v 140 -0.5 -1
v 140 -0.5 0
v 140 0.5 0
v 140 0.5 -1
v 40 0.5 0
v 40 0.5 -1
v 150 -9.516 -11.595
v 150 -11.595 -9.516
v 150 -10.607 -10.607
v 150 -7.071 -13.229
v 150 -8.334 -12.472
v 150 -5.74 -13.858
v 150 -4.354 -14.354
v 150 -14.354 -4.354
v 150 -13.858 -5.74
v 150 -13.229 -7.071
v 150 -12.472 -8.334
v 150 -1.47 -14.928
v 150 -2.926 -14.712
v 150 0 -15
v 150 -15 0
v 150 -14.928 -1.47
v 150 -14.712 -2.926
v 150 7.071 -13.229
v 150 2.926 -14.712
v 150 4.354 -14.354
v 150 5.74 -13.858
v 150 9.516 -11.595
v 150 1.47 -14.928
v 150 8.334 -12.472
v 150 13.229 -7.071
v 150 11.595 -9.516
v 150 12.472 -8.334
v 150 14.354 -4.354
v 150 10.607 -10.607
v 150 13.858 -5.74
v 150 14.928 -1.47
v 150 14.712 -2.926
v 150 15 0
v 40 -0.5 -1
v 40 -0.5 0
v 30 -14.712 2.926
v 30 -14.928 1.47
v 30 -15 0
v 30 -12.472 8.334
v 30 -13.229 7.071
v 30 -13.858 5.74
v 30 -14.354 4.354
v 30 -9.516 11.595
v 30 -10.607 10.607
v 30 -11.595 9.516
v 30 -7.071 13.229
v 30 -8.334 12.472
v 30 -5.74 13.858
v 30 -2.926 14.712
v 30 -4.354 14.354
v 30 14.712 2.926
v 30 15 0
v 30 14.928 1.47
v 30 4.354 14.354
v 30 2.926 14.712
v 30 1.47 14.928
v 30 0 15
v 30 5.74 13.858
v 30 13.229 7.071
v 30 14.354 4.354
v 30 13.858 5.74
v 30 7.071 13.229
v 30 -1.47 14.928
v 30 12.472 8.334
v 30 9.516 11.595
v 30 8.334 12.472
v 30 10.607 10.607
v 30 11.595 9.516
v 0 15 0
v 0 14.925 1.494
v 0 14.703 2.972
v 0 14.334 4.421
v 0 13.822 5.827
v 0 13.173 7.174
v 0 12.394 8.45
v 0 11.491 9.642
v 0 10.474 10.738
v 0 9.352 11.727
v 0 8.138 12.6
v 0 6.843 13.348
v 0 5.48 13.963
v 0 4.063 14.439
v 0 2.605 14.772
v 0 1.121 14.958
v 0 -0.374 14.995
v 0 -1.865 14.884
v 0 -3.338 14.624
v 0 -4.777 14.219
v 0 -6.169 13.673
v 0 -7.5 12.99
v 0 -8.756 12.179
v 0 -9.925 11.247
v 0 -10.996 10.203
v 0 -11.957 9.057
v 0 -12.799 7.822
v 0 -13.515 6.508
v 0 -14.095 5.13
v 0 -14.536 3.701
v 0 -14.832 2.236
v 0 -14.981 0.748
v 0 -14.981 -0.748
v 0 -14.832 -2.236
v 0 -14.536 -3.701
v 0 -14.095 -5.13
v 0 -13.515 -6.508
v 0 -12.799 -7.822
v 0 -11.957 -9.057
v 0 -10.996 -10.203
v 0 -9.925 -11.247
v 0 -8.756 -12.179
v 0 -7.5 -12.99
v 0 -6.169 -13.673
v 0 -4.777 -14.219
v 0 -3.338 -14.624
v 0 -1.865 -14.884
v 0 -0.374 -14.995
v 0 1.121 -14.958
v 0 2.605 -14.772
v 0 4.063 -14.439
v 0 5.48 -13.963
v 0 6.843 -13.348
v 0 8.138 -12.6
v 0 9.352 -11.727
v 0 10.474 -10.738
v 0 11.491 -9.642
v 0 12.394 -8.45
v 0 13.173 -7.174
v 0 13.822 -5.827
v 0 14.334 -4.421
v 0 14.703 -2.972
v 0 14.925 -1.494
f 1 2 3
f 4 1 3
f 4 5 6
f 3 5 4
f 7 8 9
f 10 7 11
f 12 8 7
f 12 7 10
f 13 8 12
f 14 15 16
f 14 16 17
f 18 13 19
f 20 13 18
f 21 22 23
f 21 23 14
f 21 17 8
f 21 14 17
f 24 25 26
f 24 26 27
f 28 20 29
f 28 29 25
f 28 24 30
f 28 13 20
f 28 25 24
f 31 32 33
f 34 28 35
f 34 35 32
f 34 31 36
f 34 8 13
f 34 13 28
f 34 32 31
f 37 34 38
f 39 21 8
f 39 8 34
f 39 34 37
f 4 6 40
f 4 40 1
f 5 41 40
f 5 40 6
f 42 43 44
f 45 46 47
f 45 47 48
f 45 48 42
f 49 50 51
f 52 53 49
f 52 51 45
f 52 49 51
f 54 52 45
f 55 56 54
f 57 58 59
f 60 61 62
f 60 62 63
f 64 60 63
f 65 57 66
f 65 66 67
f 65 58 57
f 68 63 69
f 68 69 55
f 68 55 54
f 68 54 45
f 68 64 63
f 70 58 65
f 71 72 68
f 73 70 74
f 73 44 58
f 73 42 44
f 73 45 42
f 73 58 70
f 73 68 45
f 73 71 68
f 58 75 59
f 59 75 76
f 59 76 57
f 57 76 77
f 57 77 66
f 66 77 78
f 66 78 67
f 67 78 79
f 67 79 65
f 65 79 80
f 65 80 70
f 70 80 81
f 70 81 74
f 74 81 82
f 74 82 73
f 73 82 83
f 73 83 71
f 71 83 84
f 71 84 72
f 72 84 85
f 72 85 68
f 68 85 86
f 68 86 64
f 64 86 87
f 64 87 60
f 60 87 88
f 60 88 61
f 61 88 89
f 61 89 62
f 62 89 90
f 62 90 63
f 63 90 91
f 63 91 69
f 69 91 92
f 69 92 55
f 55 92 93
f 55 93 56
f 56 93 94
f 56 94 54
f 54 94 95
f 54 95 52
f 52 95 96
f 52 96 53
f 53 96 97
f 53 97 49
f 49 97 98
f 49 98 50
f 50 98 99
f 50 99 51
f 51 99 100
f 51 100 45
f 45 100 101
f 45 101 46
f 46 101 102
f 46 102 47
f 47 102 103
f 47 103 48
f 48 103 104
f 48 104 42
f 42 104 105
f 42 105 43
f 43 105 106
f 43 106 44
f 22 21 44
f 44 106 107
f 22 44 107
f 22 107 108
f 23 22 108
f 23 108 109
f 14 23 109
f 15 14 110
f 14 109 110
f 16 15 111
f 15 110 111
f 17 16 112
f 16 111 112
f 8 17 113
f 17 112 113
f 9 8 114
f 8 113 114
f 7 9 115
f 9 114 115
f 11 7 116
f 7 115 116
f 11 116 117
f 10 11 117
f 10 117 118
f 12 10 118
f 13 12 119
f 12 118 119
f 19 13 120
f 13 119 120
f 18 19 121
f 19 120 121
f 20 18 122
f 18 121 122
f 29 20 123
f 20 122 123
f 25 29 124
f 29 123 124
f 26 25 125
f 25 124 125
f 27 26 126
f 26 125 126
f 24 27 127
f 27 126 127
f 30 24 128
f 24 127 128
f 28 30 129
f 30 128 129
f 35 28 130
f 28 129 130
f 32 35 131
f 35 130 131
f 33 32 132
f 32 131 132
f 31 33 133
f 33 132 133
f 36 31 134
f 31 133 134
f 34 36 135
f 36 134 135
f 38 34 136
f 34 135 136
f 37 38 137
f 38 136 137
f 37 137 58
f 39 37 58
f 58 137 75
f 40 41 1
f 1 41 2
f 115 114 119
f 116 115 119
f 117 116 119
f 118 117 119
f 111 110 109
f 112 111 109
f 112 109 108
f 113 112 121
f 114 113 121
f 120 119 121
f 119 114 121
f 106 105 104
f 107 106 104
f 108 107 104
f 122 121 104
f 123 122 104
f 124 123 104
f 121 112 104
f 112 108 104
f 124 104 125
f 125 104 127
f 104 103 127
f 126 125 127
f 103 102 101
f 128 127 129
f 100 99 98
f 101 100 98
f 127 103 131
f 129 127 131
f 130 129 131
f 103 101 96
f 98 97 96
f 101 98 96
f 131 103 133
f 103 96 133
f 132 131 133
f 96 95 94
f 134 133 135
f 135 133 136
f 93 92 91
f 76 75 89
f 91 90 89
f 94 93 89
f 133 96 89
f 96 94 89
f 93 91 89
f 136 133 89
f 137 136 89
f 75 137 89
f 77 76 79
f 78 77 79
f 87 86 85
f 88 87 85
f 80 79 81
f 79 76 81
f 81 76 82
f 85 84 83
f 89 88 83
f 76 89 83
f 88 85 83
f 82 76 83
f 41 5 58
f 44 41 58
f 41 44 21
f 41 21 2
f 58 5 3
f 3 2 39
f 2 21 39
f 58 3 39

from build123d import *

# Parameters (mm, degrees)
F0_R     = 15
F1_DEPTH = 150
F3_DEPTH = 120
F4_W     = 100
F4_H     = 1
F5_DEPTH = 1


with BuildPart() as f1:
    # F0 (on Right) → F1 (new body)
    with BuildSketch(Plane.YZ):
        Circle(F0_R)
    extrude(amount=F1_DEPTH)

    # F2 (on face) → F3 (cut)
    with BuildSketch(Plane.YZ.offset(150)):
        with BuildLine():
            ThreePointArc((15, 0), (0, 15), (-15, 0))
            Line((-15, 0), (15, 0))
        make_face()
    extrude(amount=-F3_DEPTH, mode=Mode.SUBTRACT)

    # F4 (on face) → F5 (cut)
    with BuildSketch(Plane.XY):
        with Locations((90, 0)):
            Rectangle(F4_W, F4_H)
    extrude(amount=-F5_DEPTH, mode=Mode.SUBTRACT)


solid = f1.part
